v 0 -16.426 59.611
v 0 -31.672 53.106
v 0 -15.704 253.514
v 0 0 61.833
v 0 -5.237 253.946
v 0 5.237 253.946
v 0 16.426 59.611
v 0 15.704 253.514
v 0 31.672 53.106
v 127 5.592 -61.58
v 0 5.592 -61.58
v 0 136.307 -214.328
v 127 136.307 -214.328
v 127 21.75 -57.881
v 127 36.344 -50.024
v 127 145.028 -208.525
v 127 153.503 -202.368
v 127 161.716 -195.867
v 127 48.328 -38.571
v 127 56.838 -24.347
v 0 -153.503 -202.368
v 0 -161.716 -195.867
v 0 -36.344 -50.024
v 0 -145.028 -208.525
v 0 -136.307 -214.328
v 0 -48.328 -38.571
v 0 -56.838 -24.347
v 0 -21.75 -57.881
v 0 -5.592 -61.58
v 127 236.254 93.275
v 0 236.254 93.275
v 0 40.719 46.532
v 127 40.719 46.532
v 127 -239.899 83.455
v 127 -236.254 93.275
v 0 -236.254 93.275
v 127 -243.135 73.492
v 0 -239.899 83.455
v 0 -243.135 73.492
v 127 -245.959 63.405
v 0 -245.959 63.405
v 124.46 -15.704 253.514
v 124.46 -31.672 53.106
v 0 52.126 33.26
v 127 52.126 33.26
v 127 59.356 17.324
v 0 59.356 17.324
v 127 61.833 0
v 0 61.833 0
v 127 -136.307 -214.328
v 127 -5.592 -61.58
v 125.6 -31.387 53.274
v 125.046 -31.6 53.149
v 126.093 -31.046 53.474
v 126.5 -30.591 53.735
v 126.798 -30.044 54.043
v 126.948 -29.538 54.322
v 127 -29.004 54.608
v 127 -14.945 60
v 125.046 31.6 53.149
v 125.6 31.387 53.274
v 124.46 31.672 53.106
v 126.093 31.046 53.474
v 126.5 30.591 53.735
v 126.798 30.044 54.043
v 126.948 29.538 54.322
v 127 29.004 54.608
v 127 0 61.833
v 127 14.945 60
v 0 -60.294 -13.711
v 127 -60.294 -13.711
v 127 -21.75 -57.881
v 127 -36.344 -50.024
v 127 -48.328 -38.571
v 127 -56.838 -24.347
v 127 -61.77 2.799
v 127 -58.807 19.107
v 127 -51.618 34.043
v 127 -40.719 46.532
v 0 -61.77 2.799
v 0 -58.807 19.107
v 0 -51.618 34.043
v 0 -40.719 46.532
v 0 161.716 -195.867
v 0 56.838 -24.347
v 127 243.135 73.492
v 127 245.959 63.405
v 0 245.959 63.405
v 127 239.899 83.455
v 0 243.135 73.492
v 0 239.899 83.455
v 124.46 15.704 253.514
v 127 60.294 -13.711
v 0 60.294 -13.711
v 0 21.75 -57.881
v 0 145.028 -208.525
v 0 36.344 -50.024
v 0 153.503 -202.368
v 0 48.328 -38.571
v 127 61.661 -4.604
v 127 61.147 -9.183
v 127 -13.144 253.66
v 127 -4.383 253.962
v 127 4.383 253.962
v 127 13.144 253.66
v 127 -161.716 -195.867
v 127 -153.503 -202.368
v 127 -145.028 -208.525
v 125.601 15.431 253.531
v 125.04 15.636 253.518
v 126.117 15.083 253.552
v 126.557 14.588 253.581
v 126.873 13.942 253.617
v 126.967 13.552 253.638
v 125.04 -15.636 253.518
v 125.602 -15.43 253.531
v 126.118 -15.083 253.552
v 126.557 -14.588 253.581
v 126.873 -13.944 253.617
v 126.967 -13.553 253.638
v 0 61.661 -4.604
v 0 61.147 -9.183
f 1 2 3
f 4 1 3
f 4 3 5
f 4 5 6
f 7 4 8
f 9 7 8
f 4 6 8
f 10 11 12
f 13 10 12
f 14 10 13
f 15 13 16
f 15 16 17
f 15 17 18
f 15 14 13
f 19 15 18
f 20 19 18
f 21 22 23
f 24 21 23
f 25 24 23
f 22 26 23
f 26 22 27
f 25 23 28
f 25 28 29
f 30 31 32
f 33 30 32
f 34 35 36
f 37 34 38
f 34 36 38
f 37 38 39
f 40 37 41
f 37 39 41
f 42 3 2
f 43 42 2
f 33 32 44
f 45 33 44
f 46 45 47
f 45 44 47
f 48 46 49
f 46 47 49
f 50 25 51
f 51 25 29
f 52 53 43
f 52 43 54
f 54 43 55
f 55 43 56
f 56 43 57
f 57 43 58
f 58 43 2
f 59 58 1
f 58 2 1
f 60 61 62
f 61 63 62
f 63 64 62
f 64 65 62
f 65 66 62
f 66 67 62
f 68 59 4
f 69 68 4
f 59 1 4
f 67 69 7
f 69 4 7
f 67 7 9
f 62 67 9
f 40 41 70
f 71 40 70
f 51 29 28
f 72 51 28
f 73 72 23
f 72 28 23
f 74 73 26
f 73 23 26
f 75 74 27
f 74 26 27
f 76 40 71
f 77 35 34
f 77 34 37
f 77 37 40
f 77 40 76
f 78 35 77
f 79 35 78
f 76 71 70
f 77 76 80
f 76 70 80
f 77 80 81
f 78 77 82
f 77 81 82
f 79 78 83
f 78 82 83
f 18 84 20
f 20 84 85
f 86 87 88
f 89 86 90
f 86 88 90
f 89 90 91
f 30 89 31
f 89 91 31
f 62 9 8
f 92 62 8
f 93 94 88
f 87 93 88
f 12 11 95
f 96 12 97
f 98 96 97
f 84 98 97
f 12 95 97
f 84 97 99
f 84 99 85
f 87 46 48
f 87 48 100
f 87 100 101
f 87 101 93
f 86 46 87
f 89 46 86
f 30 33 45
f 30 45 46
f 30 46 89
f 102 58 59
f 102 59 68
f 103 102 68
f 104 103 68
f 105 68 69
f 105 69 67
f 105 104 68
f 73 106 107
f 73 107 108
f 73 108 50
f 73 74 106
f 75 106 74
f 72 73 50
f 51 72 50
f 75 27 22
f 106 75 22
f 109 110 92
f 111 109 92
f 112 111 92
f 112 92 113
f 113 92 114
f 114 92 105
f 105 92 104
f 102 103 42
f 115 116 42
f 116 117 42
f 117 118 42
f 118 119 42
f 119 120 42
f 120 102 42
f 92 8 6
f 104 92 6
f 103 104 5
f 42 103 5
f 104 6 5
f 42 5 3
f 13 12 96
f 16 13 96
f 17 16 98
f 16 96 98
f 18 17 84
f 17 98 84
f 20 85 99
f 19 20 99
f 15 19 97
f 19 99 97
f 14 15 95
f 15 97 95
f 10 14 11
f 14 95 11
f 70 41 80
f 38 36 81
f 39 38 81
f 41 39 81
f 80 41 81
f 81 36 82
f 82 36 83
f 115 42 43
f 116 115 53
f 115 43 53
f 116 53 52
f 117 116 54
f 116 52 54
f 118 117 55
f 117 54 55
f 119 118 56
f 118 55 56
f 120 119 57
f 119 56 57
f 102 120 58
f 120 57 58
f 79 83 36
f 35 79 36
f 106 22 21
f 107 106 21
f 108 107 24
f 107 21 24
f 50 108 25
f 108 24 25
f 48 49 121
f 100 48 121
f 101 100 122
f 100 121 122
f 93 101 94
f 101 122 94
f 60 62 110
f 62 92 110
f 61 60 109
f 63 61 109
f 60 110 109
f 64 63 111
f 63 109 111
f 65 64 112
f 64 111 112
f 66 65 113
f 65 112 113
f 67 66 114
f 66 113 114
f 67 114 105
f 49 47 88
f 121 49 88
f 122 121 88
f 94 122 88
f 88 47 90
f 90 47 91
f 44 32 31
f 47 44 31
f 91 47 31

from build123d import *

# Parameters (mm, degrees)
F1_DEPTH = 127
F2_R     = 2.54


with BuildPart() as f1:
    # F0 (on Right) → F1 (new body)
    with BuildSketch(Plane.YZ):
        with BuildLine():
            Line((60.293559, -13.711046), (245.958905, 63.405183))
            ThreePointArc((245.958905, 63.405183), (241.568355, 78.490317), (236.253565, 93.275146))
            Line((236.253565, 93.275146), (40.719363, 46.532134))
            ThreePointArc((40.719363, 46.532134), (56.307645, 25.549073), (61.832888, 0))
            ThreePointArc((61.832888, 0), (61.44685, -6.898593), (60.293559, -13.711046))
        make_face()
        with BuildLine():
            Line((31.671714, 53.105635), (15.703569, 253.514098))
            ThreePointArc((15.703569, 253.514098), (0, 254), (-15.703569, 253.514098))
            Line((-15.703569, 253.514098), (-31.671714, 53.105635))
            ThreePointArc((-31.671714, 53.105635), (0, 61.832888), (31.671714, 53.105635))
        make_face()
        with BuildLine():
            Line((-40.719363, 46.532134), (-236.253565, 93.275146))
            ThreePointArc((-236.253565, 93.275146), (-241.568355, 78.490317), (-245.958905, 63.405183))
            Line((-245.958905, 63.405183), (-60.293559, -13.711046))
            ThreePointArc((-60.293559, -13.711046), (-58.806571, 19.107413), (-40.719363, 46.532134))
        make_face()
        with BuildLine():
            ThreePointArc((-161.716302, -195.866887), (-149.297454, -205.490317), (-136.307394, -214.32754))
            Line((-136.307394, -214.32754), (-5.591754, -61.579528))
            ThreePointArc((-5.591754, -61.579528), (-36.344459, -50.023857), (-56.837664, -24.347195))
            Line((-56.837664, -24.347195), (-161.716302, -195.866887))
        make_face()
        with BuildLine():
            ThreePointArc((136.307394, -214.32754), (149.297454, -205.490317), (161.716302, -195.866887))
            Line((161.716302, -195.866887), (56.837664, -24.347195))
            ThreePointArc((56.837664, -24.347195), (36.344459, -50.023857), (5.591754, -61.579528))
            Line((5.591754, -61.579528), (136.307394, -214.32754))
        make_face()
    extrude(amount=F1_DEPTH)

    # F2
    f2_edges = [f1.edges().sort_by_distance(p)[0] for p in [
        (127, 23.687642, 153.309867),
        (127, -23.687642, 153.309867),
    ]]
    fillet(f2_edges, radius=F2_R)


solid = f1.part
